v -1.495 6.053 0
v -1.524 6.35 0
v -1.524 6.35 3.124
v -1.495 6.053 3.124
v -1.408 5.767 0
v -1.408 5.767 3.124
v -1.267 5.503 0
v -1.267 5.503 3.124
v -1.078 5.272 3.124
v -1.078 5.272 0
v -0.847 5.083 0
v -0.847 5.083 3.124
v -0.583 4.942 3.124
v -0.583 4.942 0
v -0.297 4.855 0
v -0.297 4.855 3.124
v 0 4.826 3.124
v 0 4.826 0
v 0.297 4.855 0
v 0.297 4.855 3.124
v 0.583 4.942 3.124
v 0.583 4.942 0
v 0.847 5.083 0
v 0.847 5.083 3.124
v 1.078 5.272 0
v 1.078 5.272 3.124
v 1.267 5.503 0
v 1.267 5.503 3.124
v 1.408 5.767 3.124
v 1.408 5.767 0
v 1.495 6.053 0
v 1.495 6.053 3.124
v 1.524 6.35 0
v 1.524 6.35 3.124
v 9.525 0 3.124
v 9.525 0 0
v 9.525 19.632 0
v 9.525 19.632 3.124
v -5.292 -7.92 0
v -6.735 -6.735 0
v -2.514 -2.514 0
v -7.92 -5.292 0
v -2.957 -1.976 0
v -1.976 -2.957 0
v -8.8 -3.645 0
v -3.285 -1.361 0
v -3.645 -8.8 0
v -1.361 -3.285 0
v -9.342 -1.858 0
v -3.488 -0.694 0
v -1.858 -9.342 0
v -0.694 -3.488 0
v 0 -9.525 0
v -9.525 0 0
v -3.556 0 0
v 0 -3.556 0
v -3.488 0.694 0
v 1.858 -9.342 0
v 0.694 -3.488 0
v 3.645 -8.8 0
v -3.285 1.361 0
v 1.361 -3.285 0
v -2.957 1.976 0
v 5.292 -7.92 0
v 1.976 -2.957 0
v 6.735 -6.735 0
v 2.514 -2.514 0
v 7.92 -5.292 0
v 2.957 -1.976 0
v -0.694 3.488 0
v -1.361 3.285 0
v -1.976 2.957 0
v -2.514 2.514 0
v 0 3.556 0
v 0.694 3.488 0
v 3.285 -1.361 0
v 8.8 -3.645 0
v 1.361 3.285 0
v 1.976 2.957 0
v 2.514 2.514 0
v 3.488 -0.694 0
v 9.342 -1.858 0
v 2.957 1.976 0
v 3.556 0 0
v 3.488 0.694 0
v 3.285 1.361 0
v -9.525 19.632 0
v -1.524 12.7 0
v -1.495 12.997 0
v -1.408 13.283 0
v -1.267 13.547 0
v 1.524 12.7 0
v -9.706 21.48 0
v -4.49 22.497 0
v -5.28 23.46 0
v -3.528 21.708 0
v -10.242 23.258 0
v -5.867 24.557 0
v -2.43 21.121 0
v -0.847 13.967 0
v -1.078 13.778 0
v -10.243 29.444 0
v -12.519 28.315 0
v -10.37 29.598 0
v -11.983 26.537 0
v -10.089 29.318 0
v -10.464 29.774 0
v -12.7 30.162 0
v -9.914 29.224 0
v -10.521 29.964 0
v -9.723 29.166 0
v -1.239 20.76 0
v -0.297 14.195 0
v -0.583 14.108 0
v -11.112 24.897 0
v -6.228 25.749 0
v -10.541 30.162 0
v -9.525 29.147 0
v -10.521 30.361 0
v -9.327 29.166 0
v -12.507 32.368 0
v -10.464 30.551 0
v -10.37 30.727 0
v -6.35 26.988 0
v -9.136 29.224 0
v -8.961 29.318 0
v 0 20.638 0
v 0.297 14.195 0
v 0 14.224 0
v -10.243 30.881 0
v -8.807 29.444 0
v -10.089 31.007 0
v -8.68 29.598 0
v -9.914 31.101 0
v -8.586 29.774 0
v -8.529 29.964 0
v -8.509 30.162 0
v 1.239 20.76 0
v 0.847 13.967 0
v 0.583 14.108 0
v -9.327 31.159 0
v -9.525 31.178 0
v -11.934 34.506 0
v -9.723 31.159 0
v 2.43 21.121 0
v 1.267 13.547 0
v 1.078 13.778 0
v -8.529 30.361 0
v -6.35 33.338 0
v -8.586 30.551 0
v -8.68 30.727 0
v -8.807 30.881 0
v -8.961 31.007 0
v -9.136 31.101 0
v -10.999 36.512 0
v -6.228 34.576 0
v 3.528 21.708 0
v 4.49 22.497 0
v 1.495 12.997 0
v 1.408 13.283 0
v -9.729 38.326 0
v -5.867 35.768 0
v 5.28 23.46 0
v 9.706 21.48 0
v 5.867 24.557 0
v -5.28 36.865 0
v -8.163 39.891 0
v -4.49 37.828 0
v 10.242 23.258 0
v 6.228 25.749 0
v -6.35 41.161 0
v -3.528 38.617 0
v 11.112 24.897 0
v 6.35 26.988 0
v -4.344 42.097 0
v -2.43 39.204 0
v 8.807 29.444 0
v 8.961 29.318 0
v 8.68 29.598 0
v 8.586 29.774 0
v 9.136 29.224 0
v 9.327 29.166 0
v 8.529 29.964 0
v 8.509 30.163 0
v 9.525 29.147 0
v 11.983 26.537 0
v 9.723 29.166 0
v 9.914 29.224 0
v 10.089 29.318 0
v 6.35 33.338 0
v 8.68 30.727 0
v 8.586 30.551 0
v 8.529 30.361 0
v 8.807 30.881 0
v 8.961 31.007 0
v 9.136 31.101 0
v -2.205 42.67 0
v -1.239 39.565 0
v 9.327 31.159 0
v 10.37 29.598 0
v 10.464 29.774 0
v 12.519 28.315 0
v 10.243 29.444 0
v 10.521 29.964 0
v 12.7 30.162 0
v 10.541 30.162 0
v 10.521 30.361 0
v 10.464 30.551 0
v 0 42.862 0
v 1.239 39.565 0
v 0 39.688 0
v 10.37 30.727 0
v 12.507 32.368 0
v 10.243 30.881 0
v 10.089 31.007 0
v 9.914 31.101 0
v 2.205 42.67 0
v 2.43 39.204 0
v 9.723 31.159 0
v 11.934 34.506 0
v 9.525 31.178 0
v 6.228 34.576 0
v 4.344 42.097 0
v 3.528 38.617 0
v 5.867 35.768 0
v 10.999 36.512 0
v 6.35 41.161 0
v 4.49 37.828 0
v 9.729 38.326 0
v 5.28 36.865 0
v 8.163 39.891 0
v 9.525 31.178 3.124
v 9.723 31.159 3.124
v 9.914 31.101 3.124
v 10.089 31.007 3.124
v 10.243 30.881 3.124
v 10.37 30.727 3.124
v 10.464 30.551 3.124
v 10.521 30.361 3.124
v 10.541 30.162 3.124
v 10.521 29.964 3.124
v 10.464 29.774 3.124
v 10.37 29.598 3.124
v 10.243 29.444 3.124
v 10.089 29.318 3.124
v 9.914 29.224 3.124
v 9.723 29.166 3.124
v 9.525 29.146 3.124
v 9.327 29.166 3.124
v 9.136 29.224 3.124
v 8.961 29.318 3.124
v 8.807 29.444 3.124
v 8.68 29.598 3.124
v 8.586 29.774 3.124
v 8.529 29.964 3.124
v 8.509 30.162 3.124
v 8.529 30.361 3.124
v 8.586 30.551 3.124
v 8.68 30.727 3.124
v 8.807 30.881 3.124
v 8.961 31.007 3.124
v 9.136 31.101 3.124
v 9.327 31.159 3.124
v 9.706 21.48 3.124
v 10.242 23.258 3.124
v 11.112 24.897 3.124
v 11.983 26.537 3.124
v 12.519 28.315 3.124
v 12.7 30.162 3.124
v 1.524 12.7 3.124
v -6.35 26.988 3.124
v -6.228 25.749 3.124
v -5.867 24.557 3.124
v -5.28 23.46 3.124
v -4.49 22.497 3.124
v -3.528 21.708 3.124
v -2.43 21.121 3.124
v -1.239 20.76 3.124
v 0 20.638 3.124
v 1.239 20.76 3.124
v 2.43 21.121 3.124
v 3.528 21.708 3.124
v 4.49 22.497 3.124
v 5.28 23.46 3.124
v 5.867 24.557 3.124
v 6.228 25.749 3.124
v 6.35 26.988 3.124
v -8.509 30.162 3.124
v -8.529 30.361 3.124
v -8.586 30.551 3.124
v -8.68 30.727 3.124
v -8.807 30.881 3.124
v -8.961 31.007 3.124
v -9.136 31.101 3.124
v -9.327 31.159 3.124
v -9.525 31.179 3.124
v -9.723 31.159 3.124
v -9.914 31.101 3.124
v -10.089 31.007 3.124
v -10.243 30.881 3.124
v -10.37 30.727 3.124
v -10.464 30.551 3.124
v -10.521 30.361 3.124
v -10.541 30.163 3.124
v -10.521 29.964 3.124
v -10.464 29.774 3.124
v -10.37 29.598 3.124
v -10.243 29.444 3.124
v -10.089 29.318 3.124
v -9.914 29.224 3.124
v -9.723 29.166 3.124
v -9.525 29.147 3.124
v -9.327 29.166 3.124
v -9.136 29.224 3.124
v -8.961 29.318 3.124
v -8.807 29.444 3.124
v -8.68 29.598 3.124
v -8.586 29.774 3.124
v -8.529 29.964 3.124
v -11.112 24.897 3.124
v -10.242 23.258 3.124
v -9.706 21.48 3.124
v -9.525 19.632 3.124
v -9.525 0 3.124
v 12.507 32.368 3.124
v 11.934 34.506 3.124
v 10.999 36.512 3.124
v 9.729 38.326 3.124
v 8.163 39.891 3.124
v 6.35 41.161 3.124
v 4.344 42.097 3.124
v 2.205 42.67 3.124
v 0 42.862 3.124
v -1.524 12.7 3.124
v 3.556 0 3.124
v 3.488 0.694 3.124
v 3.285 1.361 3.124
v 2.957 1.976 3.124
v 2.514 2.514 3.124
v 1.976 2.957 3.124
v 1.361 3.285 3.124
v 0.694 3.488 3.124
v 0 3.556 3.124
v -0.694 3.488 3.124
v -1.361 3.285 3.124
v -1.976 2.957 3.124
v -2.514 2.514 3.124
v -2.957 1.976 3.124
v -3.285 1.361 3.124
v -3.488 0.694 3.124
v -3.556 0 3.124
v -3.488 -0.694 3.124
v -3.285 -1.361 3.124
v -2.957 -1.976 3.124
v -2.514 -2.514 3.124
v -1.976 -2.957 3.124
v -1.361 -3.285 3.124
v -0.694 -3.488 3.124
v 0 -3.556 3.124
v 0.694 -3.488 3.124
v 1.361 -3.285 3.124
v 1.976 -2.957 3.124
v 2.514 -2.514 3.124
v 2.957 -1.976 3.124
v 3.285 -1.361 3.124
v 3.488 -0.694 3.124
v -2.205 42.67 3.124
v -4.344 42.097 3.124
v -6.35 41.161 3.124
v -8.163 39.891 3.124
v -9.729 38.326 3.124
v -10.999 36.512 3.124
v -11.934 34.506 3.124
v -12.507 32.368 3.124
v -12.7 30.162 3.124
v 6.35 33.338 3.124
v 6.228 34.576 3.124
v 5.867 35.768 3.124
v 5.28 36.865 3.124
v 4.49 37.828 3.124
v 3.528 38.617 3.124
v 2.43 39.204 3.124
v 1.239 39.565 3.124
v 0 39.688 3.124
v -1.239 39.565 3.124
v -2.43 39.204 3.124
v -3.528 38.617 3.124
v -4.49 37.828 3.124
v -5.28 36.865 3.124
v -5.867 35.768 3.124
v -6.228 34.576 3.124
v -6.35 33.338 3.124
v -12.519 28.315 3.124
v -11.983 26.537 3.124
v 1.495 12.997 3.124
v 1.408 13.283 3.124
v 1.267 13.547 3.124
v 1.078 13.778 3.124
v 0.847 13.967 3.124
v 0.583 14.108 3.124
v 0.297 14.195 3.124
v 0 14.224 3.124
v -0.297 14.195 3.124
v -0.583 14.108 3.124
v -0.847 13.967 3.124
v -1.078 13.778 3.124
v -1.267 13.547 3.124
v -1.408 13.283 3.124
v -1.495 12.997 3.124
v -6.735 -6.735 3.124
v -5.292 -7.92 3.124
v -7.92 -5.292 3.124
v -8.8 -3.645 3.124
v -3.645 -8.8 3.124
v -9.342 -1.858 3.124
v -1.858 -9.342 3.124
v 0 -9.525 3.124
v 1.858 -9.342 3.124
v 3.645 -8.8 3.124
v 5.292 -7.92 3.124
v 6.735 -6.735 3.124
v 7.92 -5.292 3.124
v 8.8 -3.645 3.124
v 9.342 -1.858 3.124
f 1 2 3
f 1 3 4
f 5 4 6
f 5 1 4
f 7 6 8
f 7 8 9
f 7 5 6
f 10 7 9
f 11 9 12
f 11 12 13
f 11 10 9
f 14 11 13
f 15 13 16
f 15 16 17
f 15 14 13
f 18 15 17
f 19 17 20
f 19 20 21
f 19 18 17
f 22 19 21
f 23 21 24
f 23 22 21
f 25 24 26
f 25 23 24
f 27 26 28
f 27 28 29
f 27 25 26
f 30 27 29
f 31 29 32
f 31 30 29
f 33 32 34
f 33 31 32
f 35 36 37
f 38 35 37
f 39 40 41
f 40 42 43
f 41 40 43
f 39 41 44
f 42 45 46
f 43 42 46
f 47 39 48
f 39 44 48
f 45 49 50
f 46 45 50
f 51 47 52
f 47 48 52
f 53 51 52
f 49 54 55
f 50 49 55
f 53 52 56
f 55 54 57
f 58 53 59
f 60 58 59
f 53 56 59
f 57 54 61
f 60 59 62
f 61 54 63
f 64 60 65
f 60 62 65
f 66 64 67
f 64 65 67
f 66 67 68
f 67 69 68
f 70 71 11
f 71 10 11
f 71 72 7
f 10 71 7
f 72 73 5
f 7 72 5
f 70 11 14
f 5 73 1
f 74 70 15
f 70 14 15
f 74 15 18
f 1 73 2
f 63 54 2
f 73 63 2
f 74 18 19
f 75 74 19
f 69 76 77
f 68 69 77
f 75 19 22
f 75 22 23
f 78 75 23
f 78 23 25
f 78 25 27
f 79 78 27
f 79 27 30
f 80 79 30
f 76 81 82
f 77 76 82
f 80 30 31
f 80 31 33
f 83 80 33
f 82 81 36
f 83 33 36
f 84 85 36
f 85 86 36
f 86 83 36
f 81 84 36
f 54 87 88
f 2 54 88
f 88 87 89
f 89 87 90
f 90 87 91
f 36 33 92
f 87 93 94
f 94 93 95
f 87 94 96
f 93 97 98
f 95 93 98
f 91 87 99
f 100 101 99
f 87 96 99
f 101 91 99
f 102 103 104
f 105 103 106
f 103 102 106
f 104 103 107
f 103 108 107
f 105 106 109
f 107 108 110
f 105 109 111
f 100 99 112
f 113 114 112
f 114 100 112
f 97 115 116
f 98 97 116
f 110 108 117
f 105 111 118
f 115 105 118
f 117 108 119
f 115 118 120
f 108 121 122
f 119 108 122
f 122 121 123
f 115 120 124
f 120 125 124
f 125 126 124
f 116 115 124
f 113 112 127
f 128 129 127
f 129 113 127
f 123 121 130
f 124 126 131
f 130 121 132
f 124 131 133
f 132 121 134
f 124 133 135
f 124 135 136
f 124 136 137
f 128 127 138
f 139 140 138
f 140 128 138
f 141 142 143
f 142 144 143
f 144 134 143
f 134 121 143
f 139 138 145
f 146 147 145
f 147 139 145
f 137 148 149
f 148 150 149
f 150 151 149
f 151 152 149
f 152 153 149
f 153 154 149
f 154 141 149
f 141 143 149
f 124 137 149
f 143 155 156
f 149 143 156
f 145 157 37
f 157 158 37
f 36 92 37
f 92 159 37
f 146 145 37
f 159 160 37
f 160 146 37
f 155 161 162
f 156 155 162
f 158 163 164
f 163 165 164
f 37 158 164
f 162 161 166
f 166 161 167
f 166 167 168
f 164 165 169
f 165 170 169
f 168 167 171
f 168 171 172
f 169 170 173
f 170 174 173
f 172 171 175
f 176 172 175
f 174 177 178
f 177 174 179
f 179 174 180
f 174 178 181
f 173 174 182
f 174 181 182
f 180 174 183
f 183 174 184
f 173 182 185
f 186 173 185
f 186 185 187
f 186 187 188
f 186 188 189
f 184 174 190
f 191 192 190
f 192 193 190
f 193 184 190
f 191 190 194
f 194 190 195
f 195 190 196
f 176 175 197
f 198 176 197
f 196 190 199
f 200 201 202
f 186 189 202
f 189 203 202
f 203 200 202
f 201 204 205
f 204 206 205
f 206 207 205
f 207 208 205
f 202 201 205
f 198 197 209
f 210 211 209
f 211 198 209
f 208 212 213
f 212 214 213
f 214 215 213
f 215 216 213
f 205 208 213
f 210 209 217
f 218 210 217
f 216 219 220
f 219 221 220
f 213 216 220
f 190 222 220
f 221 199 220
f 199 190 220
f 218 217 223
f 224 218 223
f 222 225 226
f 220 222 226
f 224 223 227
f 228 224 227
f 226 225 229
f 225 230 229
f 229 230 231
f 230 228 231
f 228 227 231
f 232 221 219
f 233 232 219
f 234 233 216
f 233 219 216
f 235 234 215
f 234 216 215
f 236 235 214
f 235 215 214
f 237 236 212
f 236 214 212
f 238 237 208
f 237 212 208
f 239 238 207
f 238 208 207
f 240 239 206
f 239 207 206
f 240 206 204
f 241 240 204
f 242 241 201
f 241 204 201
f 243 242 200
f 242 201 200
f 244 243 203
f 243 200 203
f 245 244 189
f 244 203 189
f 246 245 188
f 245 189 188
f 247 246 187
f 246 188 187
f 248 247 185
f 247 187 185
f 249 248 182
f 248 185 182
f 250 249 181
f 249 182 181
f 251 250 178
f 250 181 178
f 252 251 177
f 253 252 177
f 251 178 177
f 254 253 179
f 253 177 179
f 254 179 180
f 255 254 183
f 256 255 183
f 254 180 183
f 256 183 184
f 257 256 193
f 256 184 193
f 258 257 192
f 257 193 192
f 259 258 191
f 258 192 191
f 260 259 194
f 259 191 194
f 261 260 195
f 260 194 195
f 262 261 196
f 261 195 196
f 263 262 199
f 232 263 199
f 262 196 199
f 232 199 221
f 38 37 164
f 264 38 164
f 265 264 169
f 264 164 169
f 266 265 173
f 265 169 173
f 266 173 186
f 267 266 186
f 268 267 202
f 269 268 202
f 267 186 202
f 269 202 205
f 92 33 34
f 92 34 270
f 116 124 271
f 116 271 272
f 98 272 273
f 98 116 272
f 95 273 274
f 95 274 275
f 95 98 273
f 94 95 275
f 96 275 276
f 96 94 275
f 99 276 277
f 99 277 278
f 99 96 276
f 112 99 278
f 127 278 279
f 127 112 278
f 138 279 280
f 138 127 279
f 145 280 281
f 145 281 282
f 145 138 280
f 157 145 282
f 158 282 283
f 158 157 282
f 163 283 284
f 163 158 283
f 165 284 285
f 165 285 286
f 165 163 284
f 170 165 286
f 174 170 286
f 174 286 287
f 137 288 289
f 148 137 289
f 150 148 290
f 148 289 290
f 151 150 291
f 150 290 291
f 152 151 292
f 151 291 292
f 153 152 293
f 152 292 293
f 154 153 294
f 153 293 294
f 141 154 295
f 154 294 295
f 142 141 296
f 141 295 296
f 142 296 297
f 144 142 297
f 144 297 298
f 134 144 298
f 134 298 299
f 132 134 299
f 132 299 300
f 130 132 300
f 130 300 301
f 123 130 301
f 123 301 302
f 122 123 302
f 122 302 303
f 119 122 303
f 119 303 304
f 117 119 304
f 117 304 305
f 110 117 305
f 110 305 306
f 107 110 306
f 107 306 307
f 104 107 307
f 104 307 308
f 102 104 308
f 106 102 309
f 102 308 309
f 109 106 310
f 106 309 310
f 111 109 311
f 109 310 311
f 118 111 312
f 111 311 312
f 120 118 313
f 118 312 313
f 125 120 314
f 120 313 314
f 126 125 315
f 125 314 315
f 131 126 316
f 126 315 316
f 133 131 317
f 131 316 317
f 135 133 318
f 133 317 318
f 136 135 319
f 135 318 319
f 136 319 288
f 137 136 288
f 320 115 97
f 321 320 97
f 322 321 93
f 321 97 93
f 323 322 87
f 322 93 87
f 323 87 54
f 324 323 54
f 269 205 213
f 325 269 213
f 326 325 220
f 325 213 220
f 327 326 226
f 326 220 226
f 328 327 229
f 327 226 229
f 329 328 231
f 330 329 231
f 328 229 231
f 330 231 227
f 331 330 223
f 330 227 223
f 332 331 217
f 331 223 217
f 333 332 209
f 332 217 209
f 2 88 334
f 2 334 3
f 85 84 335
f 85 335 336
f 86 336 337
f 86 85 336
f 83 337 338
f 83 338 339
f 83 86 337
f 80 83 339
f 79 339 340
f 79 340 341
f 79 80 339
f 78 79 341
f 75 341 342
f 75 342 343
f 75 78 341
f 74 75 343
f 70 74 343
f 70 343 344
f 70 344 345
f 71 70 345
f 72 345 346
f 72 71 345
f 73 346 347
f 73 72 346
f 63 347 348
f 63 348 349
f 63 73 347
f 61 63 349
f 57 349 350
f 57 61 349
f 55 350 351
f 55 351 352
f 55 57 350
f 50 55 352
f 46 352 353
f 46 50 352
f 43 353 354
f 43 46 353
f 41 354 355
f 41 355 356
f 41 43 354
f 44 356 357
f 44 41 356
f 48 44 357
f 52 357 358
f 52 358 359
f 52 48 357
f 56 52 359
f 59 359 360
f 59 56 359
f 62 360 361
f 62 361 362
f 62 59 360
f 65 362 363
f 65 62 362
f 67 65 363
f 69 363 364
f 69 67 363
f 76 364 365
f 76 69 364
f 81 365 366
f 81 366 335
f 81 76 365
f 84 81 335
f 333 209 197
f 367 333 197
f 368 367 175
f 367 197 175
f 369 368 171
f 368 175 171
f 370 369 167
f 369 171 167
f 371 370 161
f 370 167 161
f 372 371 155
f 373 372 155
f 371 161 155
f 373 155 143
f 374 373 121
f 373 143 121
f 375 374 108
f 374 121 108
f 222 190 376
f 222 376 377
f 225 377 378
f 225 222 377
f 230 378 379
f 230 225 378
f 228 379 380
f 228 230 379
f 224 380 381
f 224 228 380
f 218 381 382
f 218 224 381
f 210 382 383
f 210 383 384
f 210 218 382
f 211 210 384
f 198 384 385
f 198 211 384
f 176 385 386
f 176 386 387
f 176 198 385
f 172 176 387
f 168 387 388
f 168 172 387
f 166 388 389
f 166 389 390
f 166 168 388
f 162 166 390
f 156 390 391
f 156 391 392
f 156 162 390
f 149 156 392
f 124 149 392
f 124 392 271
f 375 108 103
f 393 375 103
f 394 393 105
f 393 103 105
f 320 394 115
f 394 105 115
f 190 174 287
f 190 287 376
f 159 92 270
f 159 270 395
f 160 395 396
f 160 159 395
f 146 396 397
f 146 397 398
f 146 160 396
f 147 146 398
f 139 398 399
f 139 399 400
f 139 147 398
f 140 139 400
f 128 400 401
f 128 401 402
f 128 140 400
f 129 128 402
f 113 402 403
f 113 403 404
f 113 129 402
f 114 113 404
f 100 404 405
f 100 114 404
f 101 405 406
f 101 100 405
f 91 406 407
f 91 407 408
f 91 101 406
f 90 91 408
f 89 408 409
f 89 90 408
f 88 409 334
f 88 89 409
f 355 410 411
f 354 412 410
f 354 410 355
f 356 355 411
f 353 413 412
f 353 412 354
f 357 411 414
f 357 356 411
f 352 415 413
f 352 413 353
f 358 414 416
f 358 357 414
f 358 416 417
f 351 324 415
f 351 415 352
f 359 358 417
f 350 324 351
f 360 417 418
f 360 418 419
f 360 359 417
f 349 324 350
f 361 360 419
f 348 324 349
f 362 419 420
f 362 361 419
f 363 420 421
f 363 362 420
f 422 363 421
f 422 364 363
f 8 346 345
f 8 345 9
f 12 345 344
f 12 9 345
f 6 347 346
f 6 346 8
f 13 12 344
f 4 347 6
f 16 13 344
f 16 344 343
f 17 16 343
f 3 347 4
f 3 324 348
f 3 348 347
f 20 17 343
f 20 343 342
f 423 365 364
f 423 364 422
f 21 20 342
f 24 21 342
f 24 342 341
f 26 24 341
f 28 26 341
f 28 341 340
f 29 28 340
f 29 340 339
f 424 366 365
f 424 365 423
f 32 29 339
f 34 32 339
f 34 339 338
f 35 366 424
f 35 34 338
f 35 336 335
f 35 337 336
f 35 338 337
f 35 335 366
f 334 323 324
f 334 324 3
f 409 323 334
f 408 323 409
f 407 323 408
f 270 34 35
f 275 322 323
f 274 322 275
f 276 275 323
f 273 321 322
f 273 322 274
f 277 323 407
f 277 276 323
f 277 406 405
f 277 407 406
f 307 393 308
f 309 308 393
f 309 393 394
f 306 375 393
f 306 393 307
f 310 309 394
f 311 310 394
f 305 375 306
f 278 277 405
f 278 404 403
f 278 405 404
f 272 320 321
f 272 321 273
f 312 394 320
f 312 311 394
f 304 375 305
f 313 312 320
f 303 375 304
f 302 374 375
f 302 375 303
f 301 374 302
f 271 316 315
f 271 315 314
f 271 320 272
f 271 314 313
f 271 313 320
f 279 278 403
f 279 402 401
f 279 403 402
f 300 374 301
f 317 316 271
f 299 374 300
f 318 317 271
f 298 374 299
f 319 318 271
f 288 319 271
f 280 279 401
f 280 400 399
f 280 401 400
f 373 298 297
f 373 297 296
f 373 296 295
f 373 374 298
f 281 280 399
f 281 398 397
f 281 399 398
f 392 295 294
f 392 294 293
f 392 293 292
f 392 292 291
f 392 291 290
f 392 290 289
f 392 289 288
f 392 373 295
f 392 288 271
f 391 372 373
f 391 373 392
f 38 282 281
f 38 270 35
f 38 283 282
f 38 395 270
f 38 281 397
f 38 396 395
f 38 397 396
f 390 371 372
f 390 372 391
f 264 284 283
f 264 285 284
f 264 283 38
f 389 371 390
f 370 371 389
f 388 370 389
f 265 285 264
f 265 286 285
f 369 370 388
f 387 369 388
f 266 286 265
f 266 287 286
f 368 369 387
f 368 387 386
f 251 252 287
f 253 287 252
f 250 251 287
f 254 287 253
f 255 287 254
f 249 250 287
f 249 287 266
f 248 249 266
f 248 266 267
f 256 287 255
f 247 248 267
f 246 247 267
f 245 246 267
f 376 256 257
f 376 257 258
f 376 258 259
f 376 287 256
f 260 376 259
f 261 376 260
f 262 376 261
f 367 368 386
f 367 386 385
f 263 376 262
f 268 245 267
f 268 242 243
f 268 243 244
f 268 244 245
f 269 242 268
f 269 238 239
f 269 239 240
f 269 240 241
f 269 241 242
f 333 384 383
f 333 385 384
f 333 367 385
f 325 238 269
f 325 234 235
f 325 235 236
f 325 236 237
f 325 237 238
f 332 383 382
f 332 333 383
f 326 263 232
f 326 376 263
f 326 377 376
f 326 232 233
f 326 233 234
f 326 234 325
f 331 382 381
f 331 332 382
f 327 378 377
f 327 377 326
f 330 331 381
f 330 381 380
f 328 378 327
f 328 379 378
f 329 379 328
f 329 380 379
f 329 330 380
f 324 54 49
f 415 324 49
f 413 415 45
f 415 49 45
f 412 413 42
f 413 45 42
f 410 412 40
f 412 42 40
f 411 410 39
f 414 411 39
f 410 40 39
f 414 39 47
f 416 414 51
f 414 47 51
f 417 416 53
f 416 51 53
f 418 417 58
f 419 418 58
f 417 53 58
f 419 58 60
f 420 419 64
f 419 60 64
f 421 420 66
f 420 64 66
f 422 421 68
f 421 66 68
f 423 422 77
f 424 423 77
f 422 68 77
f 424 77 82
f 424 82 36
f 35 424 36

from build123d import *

# Parameters (mm, degrees)
CROQUIS1_R              = 3.556
SALIENTE_EXTRUIR1_DEPTH = 3.1242
SALIENTE_EXTRUIR3_START = -3.1242
SALIENTE_EXTRUIR3_DEPTH = 3.1242
CROQUIS3_R              = 1.016
CORTAR_EXTRUIR1_DEPTH   = 45.81344142


with BuildPart() as part:
    # Croquis1 → Saliente-Extruir1 (new body)
    with BuildSketch(Plane.XY):
        with BuildLine():
            Line((9.525, 0), (9.525, 33.3375))
            ThreePointArc((9.525, 33.3375), (0, 42.8625), (-9.525, 33.3375))
            Line((-9.525, 33.3375), (-9.525, 0))
            ThreePointArc((-9.525, 0), (0, -9.525), (9.525, 0))
        make_face()
        Circle(CROQUIS1_R, mode=Mode.SUBTRACT)
        with BuildLine():
            ThreePointArc((-6.35, 26.9875), (0, 20.6375), (6.35, 26.9875))
            Line((6.35, 26.9875), (6.35, 33.3375))
            ThreePointArc((6.35, 33.3375), (0, 39.6875), (-6.35, 33.3375))
            Line((-6.35, 33.3375), (-6.35, 26.9875))
        make_face(mode=Mode.SUBTRACT)
        with BuildLine():
            ThreePointArc((1.524, 12.7), (0, 14.224), (-1.524, 12.7))
            Line((-1.524, 12.7), (-1.524, 6.35))
            ThreePointArc((-1.524, 6.35), (0, 4.826), (1.524, 6.35))
            Line((1.524, 6.35), (1.524, 12.7))
        make_face(mode=Mode.SUBTRACT)
    extrude(amount=SALIENTE_EXTRUIR1_DEPTH)

    # Croquis2 → Saliente-Extruir3 (add)
    with BuildSketch(Plane.XY.offset(3.1242).offset(SALIENTE_EXTRUIR3_START)):
        with BuildLine():
            ThreePointArc((-9.525, 33.3375), (-6.735192091, 40.072692091), (0, 42.8625))
            ThreePointArc((0, 42.8625), (-8.980256121, 39.142756121), (-12.7, 30.1625))
            ThreePointArc((-12.7, 30.1625), (-12.294493201, 27.412869343), (-11.1125, 24.897358145))
            ThreePointArc((-11.1125, 24.897358145), (-9.930506799, 22.381846948), (-9.525, 19.632216291))
            Line((-9.525, 19.632216291), (-9.525, 29.1465))
            ThreePointArc((-9.525, 29.1465), (-10.541, 30.1625), (-9.525, 31.1785))
            Line((-9.525, 31.1785), (-9.525, 33.3375))
        make_face()
        with BuildLine():
            ThreePointArc((12.7, 30.1625), (8.980256121, 39.142756121), (0, 42.8625))
            ThreePointArc((0, 42.8625), (6.735192091, 40.072692091), (9.525, 33.3375))
            Line((9.525, 33.3375), (9.525, 31.1785))
            ThreePointArc((9.525, 31.1785), (10.541, 30.1625), (9.525, 29.1465))
            Line((9.525, 29.1465), (9.525, 19.632216291))
            ThreePointArc((9.525, 19.632216291), (9.930506799, 22.381846948), (11.1125, 24.897358145))
            ThreePointArc((11.1125, 24.897358145), (12.294493201, 27.412869343), (12.7, 30.1625))
        make_face()
    extrude(amount=SALIENTE_EXTRUIR3_DEPTH)

    # Croquis3 → Cortar-Extruir1 (cut, through all)
    with BuildSketch(Plane.XY.offset(3.1242)):
        with Locations((-9.525, 30.1625)):
            Circle(CROQUIS3_R)
        with Locations((9.525, 30.1625)):
            Circle(CROQUIS3_R)
    extrude(amount=-CORTAR_EXTRUIR1_DEPTH, mode=Mode.SUBTRACT)


solid = part.part
